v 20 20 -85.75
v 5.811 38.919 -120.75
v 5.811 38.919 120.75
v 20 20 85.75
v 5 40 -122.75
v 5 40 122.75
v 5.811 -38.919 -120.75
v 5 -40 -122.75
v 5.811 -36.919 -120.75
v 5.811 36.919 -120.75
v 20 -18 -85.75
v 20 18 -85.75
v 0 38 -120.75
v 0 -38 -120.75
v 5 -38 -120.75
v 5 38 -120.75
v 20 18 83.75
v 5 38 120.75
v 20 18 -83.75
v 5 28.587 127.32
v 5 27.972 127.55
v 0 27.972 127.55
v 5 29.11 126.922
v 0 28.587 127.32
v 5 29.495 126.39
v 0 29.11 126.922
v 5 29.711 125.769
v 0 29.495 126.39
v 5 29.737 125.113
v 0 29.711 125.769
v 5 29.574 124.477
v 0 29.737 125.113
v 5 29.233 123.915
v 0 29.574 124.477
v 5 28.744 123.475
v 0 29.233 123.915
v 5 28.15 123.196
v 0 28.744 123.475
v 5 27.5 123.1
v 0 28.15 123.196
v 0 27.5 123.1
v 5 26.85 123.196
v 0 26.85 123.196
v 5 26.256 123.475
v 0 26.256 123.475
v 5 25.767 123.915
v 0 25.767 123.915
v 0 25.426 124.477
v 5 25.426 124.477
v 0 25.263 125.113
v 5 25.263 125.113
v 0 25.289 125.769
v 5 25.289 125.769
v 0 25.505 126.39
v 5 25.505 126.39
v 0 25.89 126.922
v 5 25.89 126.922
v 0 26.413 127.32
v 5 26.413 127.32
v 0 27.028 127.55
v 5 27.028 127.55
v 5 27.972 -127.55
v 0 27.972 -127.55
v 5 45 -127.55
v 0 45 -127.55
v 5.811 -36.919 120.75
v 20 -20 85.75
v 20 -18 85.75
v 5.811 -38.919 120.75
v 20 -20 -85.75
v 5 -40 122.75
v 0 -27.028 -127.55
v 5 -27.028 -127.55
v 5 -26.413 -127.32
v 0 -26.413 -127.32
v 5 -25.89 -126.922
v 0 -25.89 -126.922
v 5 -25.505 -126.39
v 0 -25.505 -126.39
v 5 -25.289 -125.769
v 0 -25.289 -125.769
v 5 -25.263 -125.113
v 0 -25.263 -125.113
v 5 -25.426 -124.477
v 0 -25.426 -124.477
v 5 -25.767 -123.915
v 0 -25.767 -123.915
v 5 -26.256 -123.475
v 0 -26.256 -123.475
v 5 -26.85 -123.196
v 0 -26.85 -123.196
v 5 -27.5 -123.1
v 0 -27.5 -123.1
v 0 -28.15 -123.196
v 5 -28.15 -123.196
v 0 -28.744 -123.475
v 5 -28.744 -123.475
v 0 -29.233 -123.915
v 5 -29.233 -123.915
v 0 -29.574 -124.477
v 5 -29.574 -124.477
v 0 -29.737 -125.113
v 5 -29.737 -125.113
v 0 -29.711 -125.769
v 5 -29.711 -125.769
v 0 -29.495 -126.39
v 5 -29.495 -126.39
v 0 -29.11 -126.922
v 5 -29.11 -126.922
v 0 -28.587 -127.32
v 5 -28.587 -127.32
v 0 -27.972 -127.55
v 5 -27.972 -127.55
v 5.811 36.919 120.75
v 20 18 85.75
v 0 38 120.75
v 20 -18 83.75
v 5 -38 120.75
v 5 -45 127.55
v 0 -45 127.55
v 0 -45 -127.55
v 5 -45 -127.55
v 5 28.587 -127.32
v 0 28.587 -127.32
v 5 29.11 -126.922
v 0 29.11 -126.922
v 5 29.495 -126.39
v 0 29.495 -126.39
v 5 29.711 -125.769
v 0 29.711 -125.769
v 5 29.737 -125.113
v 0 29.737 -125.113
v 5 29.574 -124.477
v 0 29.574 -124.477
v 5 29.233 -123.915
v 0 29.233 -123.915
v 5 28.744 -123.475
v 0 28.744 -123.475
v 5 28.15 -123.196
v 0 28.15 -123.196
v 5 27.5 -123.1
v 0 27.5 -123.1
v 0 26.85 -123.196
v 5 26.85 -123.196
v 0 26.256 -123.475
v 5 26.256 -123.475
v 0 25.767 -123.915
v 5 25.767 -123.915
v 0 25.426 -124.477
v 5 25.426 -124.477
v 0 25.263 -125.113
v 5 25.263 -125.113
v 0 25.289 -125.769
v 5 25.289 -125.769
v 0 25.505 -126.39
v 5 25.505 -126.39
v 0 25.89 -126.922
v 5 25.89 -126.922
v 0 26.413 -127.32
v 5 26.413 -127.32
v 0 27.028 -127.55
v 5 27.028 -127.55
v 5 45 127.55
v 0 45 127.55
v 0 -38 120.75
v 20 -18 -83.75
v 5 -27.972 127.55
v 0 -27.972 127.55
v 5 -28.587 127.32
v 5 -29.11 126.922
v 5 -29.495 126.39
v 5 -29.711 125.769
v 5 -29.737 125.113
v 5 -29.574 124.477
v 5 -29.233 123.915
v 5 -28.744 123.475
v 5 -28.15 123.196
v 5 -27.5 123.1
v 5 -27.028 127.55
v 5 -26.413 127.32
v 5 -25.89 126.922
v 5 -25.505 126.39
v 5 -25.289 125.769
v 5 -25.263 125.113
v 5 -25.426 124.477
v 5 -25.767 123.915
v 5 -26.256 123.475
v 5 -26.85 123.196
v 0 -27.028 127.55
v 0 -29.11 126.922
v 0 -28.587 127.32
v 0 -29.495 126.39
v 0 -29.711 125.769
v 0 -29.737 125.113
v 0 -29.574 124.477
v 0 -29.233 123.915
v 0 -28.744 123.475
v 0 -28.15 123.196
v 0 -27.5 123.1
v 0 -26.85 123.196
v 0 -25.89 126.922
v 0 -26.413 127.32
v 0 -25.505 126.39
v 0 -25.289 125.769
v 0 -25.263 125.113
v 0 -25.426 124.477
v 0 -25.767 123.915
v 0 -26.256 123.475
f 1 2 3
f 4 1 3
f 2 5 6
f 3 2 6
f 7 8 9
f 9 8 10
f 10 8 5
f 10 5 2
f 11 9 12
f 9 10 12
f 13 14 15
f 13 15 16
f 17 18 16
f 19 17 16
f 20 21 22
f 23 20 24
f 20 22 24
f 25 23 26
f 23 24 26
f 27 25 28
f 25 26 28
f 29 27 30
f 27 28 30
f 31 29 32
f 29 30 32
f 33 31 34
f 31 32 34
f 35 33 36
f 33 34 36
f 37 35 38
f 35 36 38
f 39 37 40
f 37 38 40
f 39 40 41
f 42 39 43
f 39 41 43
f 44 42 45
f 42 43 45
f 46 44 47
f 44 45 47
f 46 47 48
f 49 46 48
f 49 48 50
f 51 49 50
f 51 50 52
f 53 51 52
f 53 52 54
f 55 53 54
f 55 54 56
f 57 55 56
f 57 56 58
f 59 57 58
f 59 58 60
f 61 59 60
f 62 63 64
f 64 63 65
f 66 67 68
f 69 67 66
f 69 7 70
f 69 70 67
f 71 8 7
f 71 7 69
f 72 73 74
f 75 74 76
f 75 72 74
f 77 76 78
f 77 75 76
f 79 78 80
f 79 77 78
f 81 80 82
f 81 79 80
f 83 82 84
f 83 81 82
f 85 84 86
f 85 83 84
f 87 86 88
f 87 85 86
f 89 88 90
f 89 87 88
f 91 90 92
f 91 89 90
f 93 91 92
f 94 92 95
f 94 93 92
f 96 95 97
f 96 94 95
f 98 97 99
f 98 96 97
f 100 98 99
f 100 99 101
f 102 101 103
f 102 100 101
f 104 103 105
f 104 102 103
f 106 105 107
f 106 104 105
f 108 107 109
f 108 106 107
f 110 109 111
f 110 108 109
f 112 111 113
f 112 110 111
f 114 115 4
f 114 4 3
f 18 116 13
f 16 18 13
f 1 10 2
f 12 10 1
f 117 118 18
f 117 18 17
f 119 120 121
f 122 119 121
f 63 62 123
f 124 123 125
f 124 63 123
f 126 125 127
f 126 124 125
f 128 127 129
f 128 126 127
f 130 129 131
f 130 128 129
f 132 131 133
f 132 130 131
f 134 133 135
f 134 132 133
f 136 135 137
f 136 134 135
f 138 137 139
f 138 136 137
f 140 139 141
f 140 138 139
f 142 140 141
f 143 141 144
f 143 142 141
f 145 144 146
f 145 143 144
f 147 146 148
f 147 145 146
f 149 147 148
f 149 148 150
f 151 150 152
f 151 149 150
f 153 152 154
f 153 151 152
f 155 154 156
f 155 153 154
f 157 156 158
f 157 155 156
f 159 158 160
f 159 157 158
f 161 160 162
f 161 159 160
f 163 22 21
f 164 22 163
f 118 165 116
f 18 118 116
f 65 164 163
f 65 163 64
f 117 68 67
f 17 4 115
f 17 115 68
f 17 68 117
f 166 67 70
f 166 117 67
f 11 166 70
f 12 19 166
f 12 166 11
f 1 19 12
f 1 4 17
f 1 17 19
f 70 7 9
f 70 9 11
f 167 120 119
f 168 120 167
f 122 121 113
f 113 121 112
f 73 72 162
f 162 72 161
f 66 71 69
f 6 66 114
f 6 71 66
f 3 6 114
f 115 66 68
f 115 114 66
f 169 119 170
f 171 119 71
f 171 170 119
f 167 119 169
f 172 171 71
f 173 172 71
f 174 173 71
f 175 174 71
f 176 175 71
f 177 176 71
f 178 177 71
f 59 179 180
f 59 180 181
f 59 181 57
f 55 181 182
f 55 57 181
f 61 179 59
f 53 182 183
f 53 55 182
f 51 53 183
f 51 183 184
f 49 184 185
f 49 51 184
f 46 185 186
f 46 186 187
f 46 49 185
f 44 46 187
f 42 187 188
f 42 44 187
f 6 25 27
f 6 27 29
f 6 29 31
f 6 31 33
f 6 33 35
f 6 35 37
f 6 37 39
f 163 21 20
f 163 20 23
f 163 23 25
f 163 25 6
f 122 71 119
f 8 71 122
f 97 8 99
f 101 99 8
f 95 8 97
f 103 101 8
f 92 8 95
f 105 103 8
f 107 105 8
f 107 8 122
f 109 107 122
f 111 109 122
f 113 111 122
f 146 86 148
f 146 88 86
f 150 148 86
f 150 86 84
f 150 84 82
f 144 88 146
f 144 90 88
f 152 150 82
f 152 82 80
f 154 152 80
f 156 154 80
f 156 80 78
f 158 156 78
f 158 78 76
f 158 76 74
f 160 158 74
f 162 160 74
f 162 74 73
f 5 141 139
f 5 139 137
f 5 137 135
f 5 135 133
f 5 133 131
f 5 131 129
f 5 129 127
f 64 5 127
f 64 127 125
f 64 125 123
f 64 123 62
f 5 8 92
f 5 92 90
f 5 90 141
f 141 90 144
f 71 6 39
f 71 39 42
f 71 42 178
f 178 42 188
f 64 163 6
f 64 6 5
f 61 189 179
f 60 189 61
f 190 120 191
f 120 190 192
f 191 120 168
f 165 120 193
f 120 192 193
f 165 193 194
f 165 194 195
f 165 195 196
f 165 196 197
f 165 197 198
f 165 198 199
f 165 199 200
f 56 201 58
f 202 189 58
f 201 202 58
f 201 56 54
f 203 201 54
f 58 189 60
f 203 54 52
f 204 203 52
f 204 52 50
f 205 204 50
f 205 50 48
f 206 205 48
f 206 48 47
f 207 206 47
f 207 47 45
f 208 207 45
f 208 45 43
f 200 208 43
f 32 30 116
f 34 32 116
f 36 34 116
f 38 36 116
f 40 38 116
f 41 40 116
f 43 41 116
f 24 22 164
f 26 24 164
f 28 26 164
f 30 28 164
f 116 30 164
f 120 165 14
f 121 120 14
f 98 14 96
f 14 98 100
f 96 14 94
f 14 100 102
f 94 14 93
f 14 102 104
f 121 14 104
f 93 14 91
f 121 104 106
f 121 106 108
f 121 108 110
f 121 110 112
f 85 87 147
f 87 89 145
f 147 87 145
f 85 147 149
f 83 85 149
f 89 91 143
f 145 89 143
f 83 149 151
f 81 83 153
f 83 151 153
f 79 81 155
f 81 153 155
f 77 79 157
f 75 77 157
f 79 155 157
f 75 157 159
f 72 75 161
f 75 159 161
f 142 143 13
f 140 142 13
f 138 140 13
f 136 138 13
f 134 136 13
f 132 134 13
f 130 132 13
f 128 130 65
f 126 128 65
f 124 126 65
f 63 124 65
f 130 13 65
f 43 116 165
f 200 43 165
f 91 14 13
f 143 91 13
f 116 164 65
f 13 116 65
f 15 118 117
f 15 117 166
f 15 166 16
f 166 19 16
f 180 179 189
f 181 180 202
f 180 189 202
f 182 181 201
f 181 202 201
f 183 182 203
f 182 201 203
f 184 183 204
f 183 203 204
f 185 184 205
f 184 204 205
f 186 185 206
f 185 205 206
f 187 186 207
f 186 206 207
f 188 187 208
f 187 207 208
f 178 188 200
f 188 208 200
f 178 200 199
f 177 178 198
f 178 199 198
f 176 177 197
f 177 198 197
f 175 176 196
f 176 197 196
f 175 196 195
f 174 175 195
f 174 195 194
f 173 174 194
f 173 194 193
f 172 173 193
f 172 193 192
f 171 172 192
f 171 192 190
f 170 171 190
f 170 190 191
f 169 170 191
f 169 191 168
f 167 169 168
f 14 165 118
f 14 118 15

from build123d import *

# Parameters (mm, degrees)
SKETCH1_W            = 255.1
SKETCH1_H            = 90
SKETCH1_W_2          = 241.5
SKETCH1_H_2          = 76
BOSS_EXTRUDE1_DEPTH  = 5
BOSS_EXTRUDE2_DEPTH  = 78
BOSS_EXTRUDE3_DEPTH  = 2
BOSS_EXTRUDE4_DEPTH  = 241.5
CUT_EXTRUDE1_DEPTH   = 141
CUT_EXTRUDE2_DEPTH   = 141
M4_CLEARANCE_HOLE1_D = 4.5


with BuildPart() as part:
    # Sketch1 → Boss-Extrude1 (new body)
    with BuildSketch(Plane(origin=(0, 0, 0), x_dir=(0, 0, -1), z_dir=(1, 0, 0))):
        Rectangle(SKETCH1_W, SKETCH1_H)
        Rectangle(SKETCH1_W_2, SKETCH1_H_2, mode=Mode.SUBTRACT)
    extrude(amount=BOSS_EXTRUDE1_DEPTH)

    # Sketch3 → Boss-Extrude2 (add)
    with BuildSketch(Plane(origin=(0, -38, 0), x_dir=(1, 0, 0), z_dir=(0, 1, 0))):
        Polygon((5, 120.75), (20, 83.75), (20, 85.75), (5, 122.75), align=None)
    boss_extrude2 = extrude(amount=BOSS_EXTRUDE2_DEPTH)

    # Sketch6 → Boss-Extrude3 (add)
    with BuildSketch(Plane.XZ.offset(38)):
        Polygon((5, -122.75), (20, -85.75), (20, -83.75), (5, -120.75), align=None)
    boss_extrude3 = extrude(amount=BOSS_EXTRUDE3_DEPTH)

    # Mirror1: Boss-Extrude2, Boss-Extrude3 across plane
    add(boss_extrude2.mirror(Plane.XY))
    add(boss_extrude3.mirror(Plane.XY))

    # Sketch7 → Boss-Extrude4 (add)
    with BuildSketch(Plane.XY.offset(-120.75)):
        Polygon((5, 38), (20, 18), (20, 20), (5, 40), align=None)
        Polygon((5, -40), (5, -38), (20, -18), (20, -20), align=None)
    extrude(amount=BOSS_EXTRUDE4_DEPTH)

    # Sketch8 → Cut-Extrude1 (cut)
    with BuildSketch(Plane.XZ.offset(45)):
        Polygon((20, -120.75), (5.810810811, -120.75), (20, -85.75), align=None)
        Polygon((5.810810811, 120.75), (20, 120.75), (20, 85.75), align=None)
    extrude(amount=-CUT_EXTRUDE1_DEPTH, mode=Mode.SUBTRACT)

    # Sketch9 → Cut-Extrude2 (cut, symmetric)
    with BuildSketch(Plane.XY):
        Polygon((5, 40), (20, 20), (20, 40), align=None)
    cut_extrude2 = extrude(amount=CUT_EXTRUDE2_DEPTH, both=True, mode=Mode.SUBTRACT)

    # Mirror5: Cut-Extrude2 across plane
    add(cut_extrude2.mirror(Plane.ZX), mode=Mode.SUBTRACT)

    # M4 Clearance Hole1 (through all)
    with Locations(Plane(origin=(5, 0, 0), x_dir=(0, 0, -1), z_dir=(1, 0, 0))):
        with Locations((-125.35, 27.5), (-125.35, -27.5)):
            m4_clearance_hole1 = Hole(M4_CLEARANCE_HOLE1_D / 2)

    # Mirror6: M4 Clearance Hole1 across plane
    add(m4_clearance_hole1.mirror(Plane.XY), mode=Mode.SUBTRACT)


solid = part.part
